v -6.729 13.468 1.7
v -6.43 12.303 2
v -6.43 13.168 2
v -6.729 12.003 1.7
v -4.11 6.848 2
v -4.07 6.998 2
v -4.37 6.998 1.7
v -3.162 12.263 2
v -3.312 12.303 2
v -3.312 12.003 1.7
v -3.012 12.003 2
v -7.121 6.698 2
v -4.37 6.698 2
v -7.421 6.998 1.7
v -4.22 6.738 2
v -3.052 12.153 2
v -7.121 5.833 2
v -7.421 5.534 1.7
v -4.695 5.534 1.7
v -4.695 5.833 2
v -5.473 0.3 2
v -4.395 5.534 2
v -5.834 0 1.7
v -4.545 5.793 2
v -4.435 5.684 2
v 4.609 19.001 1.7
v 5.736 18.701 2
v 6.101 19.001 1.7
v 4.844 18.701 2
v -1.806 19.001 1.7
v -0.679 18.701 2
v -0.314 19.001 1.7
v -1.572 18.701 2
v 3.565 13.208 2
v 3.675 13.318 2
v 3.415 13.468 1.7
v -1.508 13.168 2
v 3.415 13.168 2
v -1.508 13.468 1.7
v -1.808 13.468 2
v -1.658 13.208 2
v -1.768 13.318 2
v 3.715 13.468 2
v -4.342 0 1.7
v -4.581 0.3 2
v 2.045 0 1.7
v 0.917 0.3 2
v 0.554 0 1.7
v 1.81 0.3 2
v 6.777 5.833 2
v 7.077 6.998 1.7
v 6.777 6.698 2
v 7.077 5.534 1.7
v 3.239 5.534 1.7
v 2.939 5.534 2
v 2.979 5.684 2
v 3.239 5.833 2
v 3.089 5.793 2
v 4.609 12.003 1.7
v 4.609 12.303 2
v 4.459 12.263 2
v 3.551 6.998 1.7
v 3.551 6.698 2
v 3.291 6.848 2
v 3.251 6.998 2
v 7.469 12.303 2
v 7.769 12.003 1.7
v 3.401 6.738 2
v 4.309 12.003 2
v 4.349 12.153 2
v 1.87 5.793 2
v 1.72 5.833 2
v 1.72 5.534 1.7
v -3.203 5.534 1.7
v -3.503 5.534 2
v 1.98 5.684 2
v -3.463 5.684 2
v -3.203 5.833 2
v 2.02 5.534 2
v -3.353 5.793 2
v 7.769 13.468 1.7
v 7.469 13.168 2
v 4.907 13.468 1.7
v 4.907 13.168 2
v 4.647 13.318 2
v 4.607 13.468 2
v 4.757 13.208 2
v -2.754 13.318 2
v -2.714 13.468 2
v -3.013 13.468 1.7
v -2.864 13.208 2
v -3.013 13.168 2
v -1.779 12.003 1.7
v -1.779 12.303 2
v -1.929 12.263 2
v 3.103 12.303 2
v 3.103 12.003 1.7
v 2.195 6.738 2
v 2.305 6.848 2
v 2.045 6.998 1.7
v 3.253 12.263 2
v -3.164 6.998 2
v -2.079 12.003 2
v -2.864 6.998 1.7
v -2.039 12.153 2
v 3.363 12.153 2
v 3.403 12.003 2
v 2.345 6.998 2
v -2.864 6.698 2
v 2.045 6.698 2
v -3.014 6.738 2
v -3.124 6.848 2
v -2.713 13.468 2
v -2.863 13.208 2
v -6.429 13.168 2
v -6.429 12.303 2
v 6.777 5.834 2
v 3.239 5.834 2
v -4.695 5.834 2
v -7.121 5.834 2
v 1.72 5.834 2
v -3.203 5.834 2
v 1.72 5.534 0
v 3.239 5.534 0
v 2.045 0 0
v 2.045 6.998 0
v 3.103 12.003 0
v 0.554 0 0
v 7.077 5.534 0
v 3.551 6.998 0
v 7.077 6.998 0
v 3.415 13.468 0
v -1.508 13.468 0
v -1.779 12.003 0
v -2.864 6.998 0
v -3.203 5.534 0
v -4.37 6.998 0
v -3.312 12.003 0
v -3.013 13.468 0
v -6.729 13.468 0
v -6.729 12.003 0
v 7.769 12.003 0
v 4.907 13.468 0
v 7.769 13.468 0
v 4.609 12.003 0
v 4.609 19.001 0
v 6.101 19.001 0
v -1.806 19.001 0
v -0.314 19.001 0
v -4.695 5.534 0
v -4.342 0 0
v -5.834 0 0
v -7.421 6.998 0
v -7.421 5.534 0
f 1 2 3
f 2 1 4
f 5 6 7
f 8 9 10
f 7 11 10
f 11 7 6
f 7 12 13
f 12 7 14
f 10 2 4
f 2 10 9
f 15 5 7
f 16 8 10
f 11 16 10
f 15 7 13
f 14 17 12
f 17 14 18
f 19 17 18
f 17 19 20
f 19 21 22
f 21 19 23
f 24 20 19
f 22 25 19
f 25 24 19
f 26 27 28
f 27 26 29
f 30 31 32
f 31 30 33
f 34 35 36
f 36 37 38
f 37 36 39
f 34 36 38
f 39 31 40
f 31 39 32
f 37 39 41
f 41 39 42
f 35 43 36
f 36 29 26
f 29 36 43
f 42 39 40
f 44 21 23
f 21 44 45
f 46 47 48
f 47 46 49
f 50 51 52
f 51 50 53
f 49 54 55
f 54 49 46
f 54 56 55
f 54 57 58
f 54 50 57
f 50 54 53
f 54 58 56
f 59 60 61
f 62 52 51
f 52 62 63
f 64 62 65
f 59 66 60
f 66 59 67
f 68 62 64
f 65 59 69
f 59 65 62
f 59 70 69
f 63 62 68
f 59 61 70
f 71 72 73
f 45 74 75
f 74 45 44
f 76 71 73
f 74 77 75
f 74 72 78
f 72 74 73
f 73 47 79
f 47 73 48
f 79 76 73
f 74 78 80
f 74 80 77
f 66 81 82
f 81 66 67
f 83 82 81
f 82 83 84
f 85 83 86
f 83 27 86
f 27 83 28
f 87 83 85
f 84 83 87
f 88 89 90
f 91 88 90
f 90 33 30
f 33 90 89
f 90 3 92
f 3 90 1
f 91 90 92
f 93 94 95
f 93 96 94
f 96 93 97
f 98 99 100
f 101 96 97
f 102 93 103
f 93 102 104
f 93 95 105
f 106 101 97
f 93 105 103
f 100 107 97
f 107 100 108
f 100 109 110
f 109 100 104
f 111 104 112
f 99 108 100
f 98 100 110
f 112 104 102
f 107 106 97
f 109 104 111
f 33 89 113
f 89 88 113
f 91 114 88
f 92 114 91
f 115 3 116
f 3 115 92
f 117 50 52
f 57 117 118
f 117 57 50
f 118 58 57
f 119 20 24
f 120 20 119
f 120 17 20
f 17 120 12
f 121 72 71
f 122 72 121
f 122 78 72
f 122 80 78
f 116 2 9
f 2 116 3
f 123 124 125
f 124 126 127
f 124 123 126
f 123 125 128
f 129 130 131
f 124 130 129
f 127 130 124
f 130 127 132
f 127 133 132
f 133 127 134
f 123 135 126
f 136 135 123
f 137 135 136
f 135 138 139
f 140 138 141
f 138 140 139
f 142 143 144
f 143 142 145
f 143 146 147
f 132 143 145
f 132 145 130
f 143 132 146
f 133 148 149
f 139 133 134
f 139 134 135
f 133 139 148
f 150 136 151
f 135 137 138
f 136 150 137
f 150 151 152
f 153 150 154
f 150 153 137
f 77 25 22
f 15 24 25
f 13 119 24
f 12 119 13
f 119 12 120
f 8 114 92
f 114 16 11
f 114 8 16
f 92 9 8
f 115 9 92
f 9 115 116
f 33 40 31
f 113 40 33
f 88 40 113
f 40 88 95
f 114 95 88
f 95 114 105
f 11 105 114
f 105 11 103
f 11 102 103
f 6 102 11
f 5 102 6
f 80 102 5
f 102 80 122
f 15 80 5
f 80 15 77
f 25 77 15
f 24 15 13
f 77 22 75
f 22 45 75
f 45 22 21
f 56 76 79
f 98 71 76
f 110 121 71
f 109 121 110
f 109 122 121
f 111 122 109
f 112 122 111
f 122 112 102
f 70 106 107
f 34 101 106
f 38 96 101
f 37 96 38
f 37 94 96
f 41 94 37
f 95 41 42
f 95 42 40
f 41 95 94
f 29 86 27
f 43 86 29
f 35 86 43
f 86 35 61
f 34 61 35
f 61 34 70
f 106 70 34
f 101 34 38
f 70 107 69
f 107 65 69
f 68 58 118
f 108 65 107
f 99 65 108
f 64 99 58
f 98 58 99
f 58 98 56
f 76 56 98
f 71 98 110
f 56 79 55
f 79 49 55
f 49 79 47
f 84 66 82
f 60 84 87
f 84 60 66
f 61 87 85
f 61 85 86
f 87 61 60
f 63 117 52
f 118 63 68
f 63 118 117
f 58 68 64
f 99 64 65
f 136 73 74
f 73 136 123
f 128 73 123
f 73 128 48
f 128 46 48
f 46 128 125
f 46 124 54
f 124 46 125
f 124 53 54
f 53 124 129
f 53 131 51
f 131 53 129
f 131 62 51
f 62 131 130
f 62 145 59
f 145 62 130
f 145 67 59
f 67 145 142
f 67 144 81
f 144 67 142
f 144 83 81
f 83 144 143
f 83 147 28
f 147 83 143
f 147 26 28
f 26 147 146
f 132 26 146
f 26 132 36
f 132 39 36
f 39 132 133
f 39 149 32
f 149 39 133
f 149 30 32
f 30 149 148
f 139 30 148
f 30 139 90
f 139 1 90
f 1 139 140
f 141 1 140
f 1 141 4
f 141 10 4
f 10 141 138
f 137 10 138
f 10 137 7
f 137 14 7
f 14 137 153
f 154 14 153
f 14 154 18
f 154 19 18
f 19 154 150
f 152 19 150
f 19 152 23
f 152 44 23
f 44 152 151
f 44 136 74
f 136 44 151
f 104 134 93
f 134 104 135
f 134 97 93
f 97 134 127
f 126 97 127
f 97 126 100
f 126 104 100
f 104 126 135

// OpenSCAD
bevel_extrude(h=2,r=.3,detail=1) text("#",size=20,$fn=1,halign="center");


module bevel_extrude(h ,r ,detail=3)
{
   difference(){
    linear_extrude(h,convexity=6)children();
    
     l=concat([[0,0]   ,[0,h-r]       ],
    [for(i=[90:-90/detail:0]) [r,h-r]+[-sin(i)*r,cos(i)*r]]
    ,[[r,h+r+.1]],[[0,h+r+.1]]
    );
   union()  for(i=[0:max(0,len(l)-2)]){
        p1=l[i];
        p2=l[i+1]+[0,0.0001];
        p3=[ 0,l[i+1].y+0.0001];
        p4=[ 0,l[i].y];
    minkowski(){
     color(rands(0,1,3))hull()rotate_extrude($fn=12,convexity=6)polygon([p1,p2,p3,p4]);
     mirror([0,0,1]) linear_extrude(0.00001)   negative2d () children();
    }
 }
    
    }}
module negative2d (){
    difference(){
    
        offset(delta=30,$fn=1)hull()children();    
        children();
    }
    }
